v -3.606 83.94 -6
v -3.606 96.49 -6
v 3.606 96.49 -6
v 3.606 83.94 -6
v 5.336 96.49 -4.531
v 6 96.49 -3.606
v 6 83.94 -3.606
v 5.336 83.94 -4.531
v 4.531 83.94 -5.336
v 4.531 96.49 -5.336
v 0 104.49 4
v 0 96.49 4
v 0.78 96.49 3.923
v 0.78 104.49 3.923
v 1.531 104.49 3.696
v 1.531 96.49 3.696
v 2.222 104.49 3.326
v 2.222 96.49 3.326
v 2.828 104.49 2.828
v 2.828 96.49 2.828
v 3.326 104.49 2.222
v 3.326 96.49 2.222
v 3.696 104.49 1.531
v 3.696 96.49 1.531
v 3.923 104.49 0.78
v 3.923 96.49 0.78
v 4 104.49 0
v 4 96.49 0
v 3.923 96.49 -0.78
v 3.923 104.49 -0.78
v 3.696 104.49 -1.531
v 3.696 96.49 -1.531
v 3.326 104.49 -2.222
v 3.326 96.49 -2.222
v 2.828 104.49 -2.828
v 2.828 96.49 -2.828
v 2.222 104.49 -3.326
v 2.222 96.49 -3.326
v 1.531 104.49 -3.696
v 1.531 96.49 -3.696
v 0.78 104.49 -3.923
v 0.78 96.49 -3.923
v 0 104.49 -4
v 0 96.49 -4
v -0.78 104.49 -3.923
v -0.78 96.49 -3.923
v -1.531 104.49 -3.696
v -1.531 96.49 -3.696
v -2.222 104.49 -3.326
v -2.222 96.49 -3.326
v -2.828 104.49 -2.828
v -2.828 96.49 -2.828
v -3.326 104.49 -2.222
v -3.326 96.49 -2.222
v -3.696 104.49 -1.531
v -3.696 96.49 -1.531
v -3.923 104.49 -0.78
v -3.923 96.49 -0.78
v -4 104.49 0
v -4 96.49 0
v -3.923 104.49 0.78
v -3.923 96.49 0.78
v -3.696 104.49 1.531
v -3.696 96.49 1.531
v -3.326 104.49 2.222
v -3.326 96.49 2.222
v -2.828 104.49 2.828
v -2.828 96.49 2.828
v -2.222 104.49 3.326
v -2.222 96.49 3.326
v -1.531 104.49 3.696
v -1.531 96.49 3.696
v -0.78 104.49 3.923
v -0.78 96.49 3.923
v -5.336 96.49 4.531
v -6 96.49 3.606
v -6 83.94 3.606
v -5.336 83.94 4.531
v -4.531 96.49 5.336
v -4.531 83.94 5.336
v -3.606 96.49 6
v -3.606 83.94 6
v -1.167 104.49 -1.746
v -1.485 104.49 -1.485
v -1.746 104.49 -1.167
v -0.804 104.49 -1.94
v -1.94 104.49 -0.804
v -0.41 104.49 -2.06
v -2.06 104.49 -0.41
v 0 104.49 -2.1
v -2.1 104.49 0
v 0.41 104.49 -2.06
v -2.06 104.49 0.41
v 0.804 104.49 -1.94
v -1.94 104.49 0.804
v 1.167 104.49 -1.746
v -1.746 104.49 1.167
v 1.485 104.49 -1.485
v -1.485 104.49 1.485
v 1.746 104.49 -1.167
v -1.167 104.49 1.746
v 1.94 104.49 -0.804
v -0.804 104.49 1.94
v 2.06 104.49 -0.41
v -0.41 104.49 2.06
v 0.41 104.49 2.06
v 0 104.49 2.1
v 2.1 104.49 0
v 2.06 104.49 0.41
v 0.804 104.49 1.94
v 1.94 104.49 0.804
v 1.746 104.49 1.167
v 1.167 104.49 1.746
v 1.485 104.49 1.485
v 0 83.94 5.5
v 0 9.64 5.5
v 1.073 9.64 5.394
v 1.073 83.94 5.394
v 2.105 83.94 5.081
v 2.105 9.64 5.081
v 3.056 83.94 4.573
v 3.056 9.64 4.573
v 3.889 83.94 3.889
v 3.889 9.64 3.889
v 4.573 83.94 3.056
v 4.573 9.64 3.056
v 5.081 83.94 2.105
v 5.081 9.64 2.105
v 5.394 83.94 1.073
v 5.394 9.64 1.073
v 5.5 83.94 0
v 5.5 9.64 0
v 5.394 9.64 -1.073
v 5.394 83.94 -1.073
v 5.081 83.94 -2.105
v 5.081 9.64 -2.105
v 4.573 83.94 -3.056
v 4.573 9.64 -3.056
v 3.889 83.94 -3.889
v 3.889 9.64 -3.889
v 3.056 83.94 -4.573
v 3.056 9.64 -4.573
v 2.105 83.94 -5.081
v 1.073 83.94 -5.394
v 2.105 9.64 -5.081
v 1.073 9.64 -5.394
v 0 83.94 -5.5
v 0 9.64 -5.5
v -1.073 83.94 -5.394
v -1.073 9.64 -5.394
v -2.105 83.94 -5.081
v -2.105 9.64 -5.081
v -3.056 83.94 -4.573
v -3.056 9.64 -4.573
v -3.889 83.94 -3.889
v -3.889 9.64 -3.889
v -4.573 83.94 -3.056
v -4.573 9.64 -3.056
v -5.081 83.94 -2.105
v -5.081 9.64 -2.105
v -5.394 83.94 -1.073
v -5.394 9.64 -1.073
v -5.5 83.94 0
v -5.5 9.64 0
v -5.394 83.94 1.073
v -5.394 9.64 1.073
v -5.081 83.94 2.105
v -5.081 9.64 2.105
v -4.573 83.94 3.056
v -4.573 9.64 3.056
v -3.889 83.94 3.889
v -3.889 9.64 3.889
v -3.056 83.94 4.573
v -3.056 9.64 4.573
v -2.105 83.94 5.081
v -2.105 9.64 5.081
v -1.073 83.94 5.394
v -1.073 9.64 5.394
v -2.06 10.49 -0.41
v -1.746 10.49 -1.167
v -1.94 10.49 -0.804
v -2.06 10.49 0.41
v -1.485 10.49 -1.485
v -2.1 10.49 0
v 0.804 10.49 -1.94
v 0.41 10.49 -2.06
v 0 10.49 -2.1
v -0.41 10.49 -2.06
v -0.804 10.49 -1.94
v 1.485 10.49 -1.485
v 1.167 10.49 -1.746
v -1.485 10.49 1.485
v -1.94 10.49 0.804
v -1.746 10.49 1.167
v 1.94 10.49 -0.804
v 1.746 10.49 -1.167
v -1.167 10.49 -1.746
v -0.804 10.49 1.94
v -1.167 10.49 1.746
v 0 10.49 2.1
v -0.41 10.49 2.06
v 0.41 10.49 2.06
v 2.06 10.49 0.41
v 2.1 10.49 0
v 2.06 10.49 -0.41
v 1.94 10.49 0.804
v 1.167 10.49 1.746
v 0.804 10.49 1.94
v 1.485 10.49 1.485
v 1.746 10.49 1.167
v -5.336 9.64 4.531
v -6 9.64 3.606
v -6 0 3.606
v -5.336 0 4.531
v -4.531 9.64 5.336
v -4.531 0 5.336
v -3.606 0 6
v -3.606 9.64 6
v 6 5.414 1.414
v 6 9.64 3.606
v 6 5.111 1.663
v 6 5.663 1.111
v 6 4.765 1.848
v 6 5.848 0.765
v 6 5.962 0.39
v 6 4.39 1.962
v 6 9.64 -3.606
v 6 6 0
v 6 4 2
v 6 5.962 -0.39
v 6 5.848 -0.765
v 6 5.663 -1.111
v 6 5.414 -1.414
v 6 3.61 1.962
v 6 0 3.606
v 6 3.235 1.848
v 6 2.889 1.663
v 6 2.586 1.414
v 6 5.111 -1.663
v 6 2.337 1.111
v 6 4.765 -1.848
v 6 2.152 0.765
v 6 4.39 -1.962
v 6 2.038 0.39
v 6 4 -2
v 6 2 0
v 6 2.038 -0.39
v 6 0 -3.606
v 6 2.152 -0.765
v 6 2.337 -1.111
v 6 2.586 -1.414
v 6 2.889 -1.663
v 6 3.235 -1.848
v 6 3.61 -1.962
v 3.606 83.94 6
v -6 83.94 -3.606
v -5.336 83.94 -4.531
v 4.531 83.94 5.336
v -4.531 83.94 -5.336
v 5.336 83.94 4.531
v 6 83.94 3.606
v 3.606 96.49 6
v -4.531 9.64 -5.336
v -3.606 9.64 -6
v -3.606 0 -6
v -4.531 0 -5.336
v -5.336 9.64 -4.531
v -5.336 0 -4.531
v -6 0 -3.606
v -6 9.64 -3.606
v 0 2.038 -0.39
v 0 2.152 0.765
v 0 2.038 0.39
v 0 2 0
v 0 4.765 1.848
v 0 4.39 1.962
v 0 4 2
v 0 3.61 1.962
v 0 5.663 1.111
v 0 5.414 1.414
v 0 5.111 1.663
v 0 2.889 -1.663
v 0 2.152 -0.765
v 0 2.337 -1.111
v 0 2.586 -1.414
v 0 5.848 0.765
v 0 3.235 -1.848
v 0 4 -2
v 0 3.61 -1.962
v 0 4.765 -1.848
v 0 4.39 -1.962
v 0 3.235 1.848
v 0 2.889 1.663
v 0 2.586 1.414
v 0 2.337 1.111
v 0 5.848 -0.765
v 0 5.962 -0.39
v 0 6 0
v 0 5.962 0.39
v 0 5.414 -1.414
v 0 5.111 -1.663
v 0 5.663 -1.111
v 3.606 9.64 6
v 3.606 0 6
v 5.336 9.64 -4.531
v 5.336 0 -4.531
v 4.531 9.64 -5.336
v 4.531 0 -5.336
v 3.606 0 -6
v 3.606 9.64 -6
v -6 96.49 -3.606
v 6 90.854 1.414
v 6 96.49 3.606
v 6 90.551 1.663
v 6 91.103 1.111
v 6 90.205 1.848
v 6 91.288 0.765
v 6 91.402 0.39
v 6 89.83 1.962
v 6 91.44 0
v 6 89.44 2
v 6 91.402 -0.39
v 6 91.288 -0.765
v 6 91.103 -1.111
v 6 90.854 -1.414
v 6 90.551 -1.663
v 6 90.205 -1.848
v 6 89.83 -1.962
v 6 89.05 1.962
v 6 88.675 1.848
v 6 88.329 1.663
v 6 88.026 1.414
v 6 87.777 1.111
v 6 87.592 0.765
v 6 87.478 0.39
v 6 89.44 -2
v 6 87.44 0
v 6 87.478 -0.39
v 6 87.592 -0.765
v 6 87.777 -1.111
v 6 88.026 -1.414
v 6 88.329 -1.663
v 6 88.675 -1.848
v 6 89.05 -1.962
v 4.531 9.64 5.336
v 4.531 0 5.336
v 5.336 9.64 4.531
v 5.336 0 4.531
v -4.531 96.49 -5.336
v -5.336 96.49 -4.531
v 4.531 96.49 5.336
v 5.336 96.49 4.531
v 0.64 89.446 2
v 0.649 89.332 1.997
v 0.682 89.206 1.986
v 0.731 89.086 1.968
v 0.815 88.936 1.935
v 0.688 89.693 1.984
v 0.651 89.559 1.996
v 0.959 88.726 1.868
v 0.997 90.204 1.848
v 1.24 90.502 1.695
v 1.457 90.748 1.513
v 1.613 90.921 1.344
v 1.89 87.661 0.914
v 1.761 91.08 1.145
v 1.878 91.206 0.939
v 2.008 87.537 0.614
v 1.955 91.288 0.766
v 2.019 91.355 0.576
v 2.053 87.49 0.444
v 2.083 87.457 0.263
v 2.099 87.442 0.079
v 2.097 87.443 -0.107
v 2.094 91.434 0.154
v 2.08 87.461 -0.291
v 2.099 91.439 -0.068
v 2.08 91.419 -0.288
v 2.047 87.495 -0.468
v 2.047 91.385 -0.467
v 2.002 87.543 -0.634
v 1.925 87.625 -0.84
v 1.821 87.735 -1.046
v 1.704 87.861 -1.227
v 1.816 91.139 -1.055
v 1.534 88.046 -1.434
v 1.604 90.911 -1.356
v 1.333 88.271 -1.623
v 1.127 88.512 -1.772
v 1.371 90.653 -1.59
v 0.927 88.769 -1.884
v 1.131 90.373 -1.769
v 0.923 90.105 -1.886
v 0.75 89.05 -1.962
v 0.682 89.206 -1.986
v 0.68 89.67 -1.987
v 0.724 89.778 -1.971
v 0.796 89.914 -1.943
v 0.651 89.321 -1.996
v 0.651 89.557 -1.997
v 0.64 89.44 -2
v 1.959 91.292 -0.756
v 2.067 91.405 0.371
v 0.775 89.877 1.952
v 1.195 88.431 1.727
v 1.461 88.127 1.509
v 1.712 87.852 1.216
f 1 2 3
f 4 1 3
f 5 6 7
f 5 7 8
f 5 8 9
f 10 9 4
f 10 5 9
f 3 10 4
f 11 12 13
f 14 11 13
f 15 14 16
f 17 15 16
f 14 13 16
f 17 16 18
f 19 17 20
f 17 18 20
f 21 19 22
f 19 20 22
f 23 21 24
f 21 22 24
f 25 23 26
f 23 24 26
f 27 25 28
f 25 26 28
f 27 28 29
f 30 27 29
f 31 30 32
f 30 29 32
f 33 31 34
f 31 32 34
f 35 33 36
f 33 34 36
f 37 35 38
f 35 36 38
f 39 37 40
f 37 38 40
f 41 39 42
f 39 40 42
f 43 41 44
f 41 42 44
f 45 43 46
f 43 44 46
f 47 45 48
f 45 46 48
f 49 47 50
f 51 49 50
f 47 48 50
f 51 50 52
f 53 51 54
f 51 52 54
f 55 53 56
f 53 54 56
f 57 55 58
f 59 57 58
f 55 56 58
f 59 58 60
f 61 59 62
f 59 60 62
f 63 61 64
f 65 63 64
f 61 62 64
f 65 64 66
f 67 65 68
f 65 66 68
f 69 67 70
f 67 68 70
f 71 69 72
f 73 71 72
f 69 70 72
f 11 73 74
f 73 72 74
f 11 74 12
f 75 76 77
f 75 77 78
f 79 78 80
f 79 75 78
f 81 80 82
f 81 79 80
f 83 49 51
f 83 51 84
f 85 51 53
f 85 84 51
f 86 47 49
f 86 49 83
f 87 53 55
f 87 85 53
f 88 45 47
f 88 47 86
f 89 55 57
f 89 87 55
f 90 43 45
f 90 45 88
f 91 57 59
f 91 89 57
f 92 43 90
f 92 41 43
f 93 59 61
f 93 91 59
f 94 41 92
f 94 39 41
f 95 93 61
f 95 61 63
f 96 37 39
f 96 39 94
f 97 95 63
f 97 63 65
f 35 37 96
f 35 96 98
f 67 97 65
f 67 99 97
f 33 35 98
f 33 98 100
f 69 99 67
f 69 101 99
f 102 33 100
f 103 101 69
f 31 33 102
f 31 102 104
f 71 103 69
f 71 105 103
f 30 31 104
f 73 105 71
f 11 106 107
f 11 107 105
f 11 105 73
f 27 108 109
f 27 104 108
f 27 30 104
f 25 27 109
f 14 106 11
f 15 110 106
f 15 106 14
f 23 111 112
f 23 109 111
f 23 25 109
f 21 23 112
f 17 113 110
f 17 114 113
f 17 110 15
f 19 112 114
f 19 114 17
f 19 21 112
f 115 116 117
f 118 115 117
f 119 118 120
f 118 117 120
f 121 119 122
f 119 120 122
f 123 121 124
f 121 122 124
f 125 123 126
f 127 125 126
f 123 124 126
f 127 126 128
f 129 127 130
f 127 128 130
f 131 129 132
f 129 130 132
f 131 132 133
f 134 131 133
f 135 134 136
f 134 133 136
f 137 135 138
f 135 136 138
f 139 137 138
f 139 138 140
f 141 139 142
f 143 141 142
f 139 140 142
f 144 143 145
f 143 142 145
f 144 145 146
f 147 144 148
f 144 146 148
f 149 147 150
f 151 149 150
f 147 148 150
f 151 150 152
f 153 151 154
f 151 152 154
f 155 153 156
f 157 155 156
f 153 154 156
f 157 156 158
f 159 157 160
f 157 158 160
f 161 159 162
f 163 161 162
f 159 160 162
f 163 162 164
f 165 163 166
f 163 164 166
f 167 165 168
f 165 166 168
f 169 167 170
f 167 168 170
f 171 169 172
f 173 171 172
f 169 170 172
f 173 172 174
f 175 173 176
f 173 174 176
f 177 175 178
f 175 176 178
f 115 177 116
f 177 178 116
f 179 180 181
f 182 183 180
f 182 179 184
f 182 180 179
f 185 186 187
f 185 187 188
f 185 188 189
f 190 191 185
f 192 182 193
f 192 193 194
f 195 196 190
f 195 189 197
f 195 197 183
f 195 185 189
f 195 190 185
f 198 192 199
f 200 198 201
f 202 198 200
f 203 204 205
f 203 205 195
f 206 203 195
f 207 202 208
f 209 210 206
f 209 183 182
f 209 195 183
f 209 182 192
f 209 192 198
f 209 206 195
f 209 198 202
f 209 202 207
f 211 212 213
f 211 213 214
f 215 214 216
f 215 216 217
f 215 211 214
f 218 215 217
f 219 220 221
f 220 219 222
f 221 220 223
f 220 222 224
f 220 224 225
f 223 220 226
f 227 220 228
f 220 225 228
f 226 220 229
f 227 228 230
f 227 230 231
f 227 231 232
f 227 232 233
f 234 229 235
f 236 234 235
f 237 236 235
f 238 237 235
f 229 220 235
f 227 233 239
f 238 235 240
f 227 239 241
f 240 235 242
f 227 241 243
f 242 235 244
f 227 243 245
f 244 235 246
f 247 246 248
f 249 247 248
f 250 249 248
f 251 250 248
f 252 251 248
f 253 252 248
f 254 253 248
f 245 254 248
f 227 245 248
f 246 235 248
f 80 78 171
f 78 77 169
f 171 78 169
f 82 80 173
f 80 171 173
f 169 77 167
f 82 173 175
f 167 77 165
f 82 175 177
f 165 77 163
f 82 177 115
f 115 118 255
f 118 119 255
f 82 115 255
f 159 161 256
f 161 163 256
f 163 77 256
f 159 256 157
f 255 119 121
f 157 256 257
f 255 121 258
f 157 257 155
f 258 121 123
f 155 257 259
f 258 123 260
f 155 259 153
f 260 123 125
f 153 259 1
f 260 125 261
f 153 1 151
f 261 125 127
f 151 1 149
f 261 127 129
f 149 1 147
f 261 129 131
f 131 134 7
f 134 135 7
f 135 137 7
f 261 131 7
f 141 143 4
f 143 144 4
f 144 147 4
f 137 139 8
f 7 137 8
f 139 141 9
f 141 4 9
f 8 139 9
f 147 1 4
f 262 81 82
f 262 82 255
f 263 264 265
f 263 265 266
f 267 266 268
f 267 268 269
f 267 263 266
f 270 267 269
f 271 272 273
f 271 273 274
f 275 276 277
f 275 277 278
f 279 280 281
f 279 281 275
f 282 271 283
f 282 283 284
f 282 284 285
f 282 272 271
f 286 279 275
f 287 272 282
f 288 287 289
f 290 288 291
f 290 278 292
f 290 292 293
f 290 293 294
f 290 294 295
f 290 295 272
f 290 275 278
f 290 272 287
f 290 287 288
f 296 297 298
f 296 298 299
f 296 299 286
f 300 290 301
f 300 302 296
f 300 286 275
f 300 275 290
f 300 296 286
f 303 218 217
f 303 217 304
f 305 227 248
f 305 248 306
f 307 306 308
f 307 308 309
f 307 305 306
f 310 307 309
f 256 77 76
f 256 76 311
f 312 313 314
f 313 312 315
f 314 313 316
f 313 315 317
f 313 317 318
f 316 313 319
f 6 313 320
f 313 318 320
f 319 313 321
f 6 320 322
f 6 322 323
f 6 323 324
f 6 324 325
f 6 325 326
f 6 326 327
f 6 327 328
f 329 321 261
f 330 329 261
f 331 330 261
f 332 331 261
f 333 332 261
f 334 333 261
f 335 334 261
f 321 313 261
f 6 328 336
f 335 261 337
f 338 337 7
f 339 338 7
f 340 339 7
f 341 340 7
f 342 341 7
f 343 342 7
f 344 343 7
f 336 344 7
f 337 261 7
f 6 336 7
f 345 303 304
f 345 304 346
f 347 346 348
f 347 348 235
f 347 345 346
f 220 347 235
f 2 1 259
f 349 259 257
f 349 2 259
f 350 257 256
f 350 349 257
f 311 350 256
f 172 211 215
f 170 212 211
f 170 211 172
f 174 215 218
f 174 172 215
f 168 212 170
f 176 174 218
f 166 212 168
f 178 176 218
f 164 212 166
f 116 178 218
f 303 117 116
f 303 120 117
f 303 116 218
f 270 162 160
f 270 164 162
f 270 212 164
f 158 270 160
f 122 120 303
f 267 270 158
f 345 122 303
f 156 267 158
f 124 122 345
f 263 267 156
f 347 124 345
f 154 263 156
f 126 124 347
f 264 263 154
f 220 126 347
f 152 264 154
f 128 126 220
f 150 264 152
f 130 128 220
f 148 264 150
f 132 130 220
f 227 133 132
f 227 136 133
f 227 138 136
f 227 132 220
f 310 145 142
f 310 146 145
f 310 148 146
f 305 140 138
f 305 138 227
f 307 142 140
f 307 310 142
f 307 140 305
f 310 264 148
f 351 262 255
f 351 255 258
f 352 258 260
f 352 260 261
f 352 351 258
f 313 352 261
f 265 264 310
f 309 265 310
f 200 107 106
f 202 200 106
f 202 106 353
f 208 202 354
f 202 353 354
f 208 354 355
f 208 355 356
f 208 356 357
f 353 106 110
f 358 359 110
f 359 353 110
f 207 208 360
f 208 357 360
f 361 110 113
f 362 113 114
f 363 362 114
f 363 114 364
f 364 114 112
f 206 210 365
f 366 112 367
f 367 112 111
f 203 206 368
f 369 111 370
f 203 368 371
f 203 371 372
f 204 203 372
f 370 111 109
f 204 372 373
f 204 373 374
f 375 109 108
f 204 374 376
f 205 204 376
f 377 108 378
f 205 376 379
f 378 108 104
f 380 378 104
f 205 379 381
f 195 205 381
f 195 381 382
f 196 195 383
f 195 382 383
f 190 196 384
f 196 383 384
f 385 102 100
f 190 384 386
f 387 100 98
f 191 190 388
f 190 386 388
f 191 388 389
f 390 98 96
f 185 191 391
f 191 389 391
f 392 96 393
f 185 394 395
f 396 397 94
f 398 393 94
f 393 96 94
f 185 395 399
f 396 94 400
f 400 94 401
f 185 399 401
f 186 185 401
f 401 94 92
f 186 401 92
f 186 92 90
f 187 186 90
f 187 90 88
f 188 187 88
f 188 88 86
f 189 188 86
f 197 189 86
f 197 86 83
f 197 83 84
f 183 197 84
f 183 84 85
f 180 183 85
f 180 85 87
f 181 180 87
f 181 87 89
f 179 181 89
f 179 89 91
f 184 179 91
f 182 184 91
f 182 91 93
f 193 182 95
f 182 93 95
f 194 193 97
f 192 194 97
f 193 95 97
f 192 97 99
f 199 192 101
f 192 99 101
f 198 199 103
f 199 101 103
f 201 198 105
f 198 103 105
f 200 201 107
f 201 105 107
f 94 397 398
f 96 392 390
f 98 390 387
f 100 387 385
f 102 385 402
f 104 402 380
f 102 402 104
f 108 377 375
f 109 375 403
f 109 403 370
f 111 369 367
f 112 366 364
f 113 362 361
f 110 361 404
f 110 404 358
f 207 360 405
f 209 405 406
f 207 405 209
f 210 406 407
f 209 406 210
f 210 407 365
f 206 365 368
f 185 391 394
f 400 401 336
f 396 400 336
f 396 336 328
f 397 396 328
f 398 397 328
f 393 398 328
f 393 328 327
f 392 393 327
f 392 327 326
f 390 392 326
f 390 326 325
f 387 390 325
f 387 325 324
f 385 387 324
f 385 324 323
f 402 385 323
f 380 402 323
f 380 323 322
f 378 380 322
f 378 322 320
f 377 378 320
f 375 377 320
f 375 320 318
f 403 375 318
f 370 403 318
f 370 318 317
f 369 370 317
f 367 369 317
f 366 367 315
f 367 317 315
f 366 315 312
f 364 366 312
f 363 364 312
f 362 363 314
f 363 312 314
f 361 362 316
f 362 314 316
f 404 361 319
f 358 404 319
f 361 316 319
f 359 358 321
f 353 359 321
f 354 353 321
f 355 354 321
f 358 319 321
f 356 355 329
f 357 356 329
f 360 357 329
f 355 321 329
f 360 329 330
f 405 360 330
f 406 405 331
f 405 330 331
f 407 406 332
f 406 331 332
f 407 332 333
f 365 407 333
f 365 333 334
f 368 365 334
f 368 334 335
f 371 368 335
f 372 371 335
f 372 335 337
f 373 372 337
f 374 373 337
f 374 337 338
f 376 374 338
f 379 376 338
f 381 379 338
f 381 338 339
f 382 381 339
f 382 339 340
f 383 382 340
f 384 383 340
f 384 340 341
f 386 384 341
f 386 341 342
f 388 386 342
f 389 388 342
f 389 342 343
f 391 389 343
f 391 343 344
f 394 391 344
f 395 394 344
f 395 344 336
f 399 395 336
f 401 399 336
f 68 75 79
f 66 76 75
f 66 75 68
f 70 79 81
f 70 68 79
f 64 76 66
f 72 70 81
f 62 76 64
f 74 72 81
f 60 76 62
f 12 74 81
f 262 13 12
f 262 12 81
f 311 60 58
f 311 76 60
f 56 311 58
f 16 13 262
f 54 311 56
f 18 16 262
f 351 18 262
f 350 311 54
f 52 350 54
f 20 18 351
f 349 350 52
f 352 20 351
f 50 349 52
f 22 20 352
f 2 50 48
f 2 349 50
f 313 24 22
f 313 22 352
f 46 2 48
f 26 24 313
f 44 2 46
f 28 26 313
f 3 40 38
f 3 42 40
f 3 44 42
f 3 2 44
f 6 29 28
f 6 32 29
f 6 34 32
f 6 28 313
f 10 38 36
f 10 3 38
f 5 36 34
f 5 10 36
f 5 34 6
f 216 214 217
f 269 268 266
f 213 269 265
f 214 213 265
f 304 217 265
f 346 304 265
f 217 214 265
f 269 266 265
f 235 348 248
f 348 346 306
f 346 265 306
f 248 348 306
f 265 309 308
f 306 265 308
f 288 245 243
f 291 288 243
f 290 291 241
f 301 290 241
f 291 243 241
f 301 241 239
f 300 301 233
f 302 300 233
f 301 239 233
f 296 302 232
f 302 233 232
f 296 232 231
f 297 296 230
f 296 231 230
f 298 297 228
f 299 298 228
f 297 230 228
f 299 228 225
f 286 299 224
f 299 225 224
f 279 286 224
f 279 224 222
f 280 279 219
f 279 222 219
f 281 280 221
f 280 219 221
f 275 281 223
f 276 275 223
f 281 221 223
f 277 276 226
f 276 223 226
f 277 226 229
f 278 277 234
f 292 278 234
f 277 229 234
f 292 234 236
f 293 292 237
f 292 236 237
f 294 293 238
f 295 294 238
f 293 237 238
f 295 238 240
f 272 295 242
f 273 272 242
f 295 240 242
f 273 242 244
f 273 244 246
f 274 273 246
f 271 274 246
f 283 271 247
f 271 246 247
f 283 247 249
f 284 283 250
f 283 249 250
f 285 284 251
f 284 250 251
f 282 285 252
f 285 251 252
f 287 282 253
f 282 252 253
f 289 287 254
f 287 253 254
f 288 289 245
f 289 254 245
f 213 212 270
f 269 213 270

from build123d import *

# Parameters (mm, degrees)
SKETCH_1_W          = 12
SKETCH_1_H          = 12
EXTRUDE_1_DEPTH     = 9.64
SKETCH_2_R          = 5.5
EXTRUDE_2_DEPTH     = 74.3
SKETCH_3_W          = 12
SKETCH_3_H          = 12
EXTRUDE_3_DEPTH     = 12.55
SKETCH_4_R          = 4
EXTRUDE_4_DEPTH     = 8
SKETCH_5_R          = 2.1
CUT_EXTRUDE_1_DEPTH = 94
SKETCH_6_R          = 10.507277245
SKETCH_6_R_2        = 7
CUT_EXTRUDE_2_DEPTH = 102
SKETCH_7_R          = 2
CUT_EXTRUDE_3_DEPTH = 6


with BuildPart() as part:
    # 草图1 → 凸台-拉伸1 (new body)
    with BuildSketch(Plane(origin=(0, 0, 0), x_dir=(1, 0, 0), z_dir=(0, 1, 0))):
        Rectangle(SKETCH_1_W, SKETCH_1_H)
    extrude(amount=EXTRUDE_1_DEPTH)

    # 草图2 → 凸台-拉伸2 (add)
    with BuildSketch(Plane(origin=(0, 9.64, 0), x_dir=(1, 0, 0), z_dir=(0, 1, 0))):
        Circle(SKETCH_2_R)
    extrude(amount=EXTRUDE_2_DEPTH)

    # 草图3 → 凸台-拉伸3 (add)
    with BuildSketch(Plane(origin=(0, 83.94, 0), x_dir=(1, 0, 0), z_dir=(0, 1, 0))):
        Rectangle(SKETCH_3_W, SKETCH_3_H)
    extrude(amount=EXTRUDE_3_DEPTH)

    # 草图4 → 凸台-拉伸4 (add)
    with BuildSketch(Plane(origin=(0, 96.49, 0), x_dir=(1, 0, 0), z_dir=(0, 1, 0))):
        Circle(SKETCH_4_R)
    extrude(amount=EXTRUDE_4_DEPTH)

    # 草图5 → 切除-拉伸1 (cut)
    with BuildSketch(Plane(origin=(0, 104.49, 0), x_dir=(1, 0, 0), z_dir=(0, 1, 0))):
        Circle(SKETCH_5_R)
    extrude(amount=-CUT_EXTRUDE_1_DEPTH, mode=Mode.SUBTRACT)

    # 草图6 → 切除-拉伸2 (cut)
    with BuildSketch(Plane(origin=(0, 96.49, 0), x_dir=(1, 0, 0), z_dir=(0, 1, 0))):
        Circle(SKETCH_6_R)
        Circle(SKETCH_6_R_2, mode=Mode.SUBTRACT)
    extrude(amount=-CUT_EXTRUDE_2_DEPTH, mode=Mode.SUBTRACT)

    # 草图7 → 切除-拉伸3 (cut)
    with BuildSketch(Plane(origin=(6, 0, 0), x_dir=(0, 0, -1), z_dir=(1, 0, 0))):
        with Locations((0, 4)):
            Circle(SKETCH_7_R)
        with Locations((0, 89.44)):
            Circle(SKETCH_7_R)
    extrude(amount=-CUT_EXTRUDE_3_DEPTH, mode=Mode.SUBTRACT)


solid = part.part
